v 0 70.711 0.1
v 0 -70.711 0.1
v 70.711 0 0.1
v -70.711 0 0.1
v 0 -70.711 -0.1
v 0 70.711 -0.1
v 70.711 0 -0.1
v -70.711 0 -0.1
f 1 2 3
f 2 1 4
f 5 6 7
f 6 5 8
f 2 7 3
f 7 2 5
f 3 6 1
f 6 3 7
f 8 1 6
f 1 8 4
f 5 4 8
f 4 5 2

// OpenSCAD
layerHeight = 0.2;
length = 100;

rotate([0, 0, 45]) {
    cube([length, length, layerHeight], center = true);
}
